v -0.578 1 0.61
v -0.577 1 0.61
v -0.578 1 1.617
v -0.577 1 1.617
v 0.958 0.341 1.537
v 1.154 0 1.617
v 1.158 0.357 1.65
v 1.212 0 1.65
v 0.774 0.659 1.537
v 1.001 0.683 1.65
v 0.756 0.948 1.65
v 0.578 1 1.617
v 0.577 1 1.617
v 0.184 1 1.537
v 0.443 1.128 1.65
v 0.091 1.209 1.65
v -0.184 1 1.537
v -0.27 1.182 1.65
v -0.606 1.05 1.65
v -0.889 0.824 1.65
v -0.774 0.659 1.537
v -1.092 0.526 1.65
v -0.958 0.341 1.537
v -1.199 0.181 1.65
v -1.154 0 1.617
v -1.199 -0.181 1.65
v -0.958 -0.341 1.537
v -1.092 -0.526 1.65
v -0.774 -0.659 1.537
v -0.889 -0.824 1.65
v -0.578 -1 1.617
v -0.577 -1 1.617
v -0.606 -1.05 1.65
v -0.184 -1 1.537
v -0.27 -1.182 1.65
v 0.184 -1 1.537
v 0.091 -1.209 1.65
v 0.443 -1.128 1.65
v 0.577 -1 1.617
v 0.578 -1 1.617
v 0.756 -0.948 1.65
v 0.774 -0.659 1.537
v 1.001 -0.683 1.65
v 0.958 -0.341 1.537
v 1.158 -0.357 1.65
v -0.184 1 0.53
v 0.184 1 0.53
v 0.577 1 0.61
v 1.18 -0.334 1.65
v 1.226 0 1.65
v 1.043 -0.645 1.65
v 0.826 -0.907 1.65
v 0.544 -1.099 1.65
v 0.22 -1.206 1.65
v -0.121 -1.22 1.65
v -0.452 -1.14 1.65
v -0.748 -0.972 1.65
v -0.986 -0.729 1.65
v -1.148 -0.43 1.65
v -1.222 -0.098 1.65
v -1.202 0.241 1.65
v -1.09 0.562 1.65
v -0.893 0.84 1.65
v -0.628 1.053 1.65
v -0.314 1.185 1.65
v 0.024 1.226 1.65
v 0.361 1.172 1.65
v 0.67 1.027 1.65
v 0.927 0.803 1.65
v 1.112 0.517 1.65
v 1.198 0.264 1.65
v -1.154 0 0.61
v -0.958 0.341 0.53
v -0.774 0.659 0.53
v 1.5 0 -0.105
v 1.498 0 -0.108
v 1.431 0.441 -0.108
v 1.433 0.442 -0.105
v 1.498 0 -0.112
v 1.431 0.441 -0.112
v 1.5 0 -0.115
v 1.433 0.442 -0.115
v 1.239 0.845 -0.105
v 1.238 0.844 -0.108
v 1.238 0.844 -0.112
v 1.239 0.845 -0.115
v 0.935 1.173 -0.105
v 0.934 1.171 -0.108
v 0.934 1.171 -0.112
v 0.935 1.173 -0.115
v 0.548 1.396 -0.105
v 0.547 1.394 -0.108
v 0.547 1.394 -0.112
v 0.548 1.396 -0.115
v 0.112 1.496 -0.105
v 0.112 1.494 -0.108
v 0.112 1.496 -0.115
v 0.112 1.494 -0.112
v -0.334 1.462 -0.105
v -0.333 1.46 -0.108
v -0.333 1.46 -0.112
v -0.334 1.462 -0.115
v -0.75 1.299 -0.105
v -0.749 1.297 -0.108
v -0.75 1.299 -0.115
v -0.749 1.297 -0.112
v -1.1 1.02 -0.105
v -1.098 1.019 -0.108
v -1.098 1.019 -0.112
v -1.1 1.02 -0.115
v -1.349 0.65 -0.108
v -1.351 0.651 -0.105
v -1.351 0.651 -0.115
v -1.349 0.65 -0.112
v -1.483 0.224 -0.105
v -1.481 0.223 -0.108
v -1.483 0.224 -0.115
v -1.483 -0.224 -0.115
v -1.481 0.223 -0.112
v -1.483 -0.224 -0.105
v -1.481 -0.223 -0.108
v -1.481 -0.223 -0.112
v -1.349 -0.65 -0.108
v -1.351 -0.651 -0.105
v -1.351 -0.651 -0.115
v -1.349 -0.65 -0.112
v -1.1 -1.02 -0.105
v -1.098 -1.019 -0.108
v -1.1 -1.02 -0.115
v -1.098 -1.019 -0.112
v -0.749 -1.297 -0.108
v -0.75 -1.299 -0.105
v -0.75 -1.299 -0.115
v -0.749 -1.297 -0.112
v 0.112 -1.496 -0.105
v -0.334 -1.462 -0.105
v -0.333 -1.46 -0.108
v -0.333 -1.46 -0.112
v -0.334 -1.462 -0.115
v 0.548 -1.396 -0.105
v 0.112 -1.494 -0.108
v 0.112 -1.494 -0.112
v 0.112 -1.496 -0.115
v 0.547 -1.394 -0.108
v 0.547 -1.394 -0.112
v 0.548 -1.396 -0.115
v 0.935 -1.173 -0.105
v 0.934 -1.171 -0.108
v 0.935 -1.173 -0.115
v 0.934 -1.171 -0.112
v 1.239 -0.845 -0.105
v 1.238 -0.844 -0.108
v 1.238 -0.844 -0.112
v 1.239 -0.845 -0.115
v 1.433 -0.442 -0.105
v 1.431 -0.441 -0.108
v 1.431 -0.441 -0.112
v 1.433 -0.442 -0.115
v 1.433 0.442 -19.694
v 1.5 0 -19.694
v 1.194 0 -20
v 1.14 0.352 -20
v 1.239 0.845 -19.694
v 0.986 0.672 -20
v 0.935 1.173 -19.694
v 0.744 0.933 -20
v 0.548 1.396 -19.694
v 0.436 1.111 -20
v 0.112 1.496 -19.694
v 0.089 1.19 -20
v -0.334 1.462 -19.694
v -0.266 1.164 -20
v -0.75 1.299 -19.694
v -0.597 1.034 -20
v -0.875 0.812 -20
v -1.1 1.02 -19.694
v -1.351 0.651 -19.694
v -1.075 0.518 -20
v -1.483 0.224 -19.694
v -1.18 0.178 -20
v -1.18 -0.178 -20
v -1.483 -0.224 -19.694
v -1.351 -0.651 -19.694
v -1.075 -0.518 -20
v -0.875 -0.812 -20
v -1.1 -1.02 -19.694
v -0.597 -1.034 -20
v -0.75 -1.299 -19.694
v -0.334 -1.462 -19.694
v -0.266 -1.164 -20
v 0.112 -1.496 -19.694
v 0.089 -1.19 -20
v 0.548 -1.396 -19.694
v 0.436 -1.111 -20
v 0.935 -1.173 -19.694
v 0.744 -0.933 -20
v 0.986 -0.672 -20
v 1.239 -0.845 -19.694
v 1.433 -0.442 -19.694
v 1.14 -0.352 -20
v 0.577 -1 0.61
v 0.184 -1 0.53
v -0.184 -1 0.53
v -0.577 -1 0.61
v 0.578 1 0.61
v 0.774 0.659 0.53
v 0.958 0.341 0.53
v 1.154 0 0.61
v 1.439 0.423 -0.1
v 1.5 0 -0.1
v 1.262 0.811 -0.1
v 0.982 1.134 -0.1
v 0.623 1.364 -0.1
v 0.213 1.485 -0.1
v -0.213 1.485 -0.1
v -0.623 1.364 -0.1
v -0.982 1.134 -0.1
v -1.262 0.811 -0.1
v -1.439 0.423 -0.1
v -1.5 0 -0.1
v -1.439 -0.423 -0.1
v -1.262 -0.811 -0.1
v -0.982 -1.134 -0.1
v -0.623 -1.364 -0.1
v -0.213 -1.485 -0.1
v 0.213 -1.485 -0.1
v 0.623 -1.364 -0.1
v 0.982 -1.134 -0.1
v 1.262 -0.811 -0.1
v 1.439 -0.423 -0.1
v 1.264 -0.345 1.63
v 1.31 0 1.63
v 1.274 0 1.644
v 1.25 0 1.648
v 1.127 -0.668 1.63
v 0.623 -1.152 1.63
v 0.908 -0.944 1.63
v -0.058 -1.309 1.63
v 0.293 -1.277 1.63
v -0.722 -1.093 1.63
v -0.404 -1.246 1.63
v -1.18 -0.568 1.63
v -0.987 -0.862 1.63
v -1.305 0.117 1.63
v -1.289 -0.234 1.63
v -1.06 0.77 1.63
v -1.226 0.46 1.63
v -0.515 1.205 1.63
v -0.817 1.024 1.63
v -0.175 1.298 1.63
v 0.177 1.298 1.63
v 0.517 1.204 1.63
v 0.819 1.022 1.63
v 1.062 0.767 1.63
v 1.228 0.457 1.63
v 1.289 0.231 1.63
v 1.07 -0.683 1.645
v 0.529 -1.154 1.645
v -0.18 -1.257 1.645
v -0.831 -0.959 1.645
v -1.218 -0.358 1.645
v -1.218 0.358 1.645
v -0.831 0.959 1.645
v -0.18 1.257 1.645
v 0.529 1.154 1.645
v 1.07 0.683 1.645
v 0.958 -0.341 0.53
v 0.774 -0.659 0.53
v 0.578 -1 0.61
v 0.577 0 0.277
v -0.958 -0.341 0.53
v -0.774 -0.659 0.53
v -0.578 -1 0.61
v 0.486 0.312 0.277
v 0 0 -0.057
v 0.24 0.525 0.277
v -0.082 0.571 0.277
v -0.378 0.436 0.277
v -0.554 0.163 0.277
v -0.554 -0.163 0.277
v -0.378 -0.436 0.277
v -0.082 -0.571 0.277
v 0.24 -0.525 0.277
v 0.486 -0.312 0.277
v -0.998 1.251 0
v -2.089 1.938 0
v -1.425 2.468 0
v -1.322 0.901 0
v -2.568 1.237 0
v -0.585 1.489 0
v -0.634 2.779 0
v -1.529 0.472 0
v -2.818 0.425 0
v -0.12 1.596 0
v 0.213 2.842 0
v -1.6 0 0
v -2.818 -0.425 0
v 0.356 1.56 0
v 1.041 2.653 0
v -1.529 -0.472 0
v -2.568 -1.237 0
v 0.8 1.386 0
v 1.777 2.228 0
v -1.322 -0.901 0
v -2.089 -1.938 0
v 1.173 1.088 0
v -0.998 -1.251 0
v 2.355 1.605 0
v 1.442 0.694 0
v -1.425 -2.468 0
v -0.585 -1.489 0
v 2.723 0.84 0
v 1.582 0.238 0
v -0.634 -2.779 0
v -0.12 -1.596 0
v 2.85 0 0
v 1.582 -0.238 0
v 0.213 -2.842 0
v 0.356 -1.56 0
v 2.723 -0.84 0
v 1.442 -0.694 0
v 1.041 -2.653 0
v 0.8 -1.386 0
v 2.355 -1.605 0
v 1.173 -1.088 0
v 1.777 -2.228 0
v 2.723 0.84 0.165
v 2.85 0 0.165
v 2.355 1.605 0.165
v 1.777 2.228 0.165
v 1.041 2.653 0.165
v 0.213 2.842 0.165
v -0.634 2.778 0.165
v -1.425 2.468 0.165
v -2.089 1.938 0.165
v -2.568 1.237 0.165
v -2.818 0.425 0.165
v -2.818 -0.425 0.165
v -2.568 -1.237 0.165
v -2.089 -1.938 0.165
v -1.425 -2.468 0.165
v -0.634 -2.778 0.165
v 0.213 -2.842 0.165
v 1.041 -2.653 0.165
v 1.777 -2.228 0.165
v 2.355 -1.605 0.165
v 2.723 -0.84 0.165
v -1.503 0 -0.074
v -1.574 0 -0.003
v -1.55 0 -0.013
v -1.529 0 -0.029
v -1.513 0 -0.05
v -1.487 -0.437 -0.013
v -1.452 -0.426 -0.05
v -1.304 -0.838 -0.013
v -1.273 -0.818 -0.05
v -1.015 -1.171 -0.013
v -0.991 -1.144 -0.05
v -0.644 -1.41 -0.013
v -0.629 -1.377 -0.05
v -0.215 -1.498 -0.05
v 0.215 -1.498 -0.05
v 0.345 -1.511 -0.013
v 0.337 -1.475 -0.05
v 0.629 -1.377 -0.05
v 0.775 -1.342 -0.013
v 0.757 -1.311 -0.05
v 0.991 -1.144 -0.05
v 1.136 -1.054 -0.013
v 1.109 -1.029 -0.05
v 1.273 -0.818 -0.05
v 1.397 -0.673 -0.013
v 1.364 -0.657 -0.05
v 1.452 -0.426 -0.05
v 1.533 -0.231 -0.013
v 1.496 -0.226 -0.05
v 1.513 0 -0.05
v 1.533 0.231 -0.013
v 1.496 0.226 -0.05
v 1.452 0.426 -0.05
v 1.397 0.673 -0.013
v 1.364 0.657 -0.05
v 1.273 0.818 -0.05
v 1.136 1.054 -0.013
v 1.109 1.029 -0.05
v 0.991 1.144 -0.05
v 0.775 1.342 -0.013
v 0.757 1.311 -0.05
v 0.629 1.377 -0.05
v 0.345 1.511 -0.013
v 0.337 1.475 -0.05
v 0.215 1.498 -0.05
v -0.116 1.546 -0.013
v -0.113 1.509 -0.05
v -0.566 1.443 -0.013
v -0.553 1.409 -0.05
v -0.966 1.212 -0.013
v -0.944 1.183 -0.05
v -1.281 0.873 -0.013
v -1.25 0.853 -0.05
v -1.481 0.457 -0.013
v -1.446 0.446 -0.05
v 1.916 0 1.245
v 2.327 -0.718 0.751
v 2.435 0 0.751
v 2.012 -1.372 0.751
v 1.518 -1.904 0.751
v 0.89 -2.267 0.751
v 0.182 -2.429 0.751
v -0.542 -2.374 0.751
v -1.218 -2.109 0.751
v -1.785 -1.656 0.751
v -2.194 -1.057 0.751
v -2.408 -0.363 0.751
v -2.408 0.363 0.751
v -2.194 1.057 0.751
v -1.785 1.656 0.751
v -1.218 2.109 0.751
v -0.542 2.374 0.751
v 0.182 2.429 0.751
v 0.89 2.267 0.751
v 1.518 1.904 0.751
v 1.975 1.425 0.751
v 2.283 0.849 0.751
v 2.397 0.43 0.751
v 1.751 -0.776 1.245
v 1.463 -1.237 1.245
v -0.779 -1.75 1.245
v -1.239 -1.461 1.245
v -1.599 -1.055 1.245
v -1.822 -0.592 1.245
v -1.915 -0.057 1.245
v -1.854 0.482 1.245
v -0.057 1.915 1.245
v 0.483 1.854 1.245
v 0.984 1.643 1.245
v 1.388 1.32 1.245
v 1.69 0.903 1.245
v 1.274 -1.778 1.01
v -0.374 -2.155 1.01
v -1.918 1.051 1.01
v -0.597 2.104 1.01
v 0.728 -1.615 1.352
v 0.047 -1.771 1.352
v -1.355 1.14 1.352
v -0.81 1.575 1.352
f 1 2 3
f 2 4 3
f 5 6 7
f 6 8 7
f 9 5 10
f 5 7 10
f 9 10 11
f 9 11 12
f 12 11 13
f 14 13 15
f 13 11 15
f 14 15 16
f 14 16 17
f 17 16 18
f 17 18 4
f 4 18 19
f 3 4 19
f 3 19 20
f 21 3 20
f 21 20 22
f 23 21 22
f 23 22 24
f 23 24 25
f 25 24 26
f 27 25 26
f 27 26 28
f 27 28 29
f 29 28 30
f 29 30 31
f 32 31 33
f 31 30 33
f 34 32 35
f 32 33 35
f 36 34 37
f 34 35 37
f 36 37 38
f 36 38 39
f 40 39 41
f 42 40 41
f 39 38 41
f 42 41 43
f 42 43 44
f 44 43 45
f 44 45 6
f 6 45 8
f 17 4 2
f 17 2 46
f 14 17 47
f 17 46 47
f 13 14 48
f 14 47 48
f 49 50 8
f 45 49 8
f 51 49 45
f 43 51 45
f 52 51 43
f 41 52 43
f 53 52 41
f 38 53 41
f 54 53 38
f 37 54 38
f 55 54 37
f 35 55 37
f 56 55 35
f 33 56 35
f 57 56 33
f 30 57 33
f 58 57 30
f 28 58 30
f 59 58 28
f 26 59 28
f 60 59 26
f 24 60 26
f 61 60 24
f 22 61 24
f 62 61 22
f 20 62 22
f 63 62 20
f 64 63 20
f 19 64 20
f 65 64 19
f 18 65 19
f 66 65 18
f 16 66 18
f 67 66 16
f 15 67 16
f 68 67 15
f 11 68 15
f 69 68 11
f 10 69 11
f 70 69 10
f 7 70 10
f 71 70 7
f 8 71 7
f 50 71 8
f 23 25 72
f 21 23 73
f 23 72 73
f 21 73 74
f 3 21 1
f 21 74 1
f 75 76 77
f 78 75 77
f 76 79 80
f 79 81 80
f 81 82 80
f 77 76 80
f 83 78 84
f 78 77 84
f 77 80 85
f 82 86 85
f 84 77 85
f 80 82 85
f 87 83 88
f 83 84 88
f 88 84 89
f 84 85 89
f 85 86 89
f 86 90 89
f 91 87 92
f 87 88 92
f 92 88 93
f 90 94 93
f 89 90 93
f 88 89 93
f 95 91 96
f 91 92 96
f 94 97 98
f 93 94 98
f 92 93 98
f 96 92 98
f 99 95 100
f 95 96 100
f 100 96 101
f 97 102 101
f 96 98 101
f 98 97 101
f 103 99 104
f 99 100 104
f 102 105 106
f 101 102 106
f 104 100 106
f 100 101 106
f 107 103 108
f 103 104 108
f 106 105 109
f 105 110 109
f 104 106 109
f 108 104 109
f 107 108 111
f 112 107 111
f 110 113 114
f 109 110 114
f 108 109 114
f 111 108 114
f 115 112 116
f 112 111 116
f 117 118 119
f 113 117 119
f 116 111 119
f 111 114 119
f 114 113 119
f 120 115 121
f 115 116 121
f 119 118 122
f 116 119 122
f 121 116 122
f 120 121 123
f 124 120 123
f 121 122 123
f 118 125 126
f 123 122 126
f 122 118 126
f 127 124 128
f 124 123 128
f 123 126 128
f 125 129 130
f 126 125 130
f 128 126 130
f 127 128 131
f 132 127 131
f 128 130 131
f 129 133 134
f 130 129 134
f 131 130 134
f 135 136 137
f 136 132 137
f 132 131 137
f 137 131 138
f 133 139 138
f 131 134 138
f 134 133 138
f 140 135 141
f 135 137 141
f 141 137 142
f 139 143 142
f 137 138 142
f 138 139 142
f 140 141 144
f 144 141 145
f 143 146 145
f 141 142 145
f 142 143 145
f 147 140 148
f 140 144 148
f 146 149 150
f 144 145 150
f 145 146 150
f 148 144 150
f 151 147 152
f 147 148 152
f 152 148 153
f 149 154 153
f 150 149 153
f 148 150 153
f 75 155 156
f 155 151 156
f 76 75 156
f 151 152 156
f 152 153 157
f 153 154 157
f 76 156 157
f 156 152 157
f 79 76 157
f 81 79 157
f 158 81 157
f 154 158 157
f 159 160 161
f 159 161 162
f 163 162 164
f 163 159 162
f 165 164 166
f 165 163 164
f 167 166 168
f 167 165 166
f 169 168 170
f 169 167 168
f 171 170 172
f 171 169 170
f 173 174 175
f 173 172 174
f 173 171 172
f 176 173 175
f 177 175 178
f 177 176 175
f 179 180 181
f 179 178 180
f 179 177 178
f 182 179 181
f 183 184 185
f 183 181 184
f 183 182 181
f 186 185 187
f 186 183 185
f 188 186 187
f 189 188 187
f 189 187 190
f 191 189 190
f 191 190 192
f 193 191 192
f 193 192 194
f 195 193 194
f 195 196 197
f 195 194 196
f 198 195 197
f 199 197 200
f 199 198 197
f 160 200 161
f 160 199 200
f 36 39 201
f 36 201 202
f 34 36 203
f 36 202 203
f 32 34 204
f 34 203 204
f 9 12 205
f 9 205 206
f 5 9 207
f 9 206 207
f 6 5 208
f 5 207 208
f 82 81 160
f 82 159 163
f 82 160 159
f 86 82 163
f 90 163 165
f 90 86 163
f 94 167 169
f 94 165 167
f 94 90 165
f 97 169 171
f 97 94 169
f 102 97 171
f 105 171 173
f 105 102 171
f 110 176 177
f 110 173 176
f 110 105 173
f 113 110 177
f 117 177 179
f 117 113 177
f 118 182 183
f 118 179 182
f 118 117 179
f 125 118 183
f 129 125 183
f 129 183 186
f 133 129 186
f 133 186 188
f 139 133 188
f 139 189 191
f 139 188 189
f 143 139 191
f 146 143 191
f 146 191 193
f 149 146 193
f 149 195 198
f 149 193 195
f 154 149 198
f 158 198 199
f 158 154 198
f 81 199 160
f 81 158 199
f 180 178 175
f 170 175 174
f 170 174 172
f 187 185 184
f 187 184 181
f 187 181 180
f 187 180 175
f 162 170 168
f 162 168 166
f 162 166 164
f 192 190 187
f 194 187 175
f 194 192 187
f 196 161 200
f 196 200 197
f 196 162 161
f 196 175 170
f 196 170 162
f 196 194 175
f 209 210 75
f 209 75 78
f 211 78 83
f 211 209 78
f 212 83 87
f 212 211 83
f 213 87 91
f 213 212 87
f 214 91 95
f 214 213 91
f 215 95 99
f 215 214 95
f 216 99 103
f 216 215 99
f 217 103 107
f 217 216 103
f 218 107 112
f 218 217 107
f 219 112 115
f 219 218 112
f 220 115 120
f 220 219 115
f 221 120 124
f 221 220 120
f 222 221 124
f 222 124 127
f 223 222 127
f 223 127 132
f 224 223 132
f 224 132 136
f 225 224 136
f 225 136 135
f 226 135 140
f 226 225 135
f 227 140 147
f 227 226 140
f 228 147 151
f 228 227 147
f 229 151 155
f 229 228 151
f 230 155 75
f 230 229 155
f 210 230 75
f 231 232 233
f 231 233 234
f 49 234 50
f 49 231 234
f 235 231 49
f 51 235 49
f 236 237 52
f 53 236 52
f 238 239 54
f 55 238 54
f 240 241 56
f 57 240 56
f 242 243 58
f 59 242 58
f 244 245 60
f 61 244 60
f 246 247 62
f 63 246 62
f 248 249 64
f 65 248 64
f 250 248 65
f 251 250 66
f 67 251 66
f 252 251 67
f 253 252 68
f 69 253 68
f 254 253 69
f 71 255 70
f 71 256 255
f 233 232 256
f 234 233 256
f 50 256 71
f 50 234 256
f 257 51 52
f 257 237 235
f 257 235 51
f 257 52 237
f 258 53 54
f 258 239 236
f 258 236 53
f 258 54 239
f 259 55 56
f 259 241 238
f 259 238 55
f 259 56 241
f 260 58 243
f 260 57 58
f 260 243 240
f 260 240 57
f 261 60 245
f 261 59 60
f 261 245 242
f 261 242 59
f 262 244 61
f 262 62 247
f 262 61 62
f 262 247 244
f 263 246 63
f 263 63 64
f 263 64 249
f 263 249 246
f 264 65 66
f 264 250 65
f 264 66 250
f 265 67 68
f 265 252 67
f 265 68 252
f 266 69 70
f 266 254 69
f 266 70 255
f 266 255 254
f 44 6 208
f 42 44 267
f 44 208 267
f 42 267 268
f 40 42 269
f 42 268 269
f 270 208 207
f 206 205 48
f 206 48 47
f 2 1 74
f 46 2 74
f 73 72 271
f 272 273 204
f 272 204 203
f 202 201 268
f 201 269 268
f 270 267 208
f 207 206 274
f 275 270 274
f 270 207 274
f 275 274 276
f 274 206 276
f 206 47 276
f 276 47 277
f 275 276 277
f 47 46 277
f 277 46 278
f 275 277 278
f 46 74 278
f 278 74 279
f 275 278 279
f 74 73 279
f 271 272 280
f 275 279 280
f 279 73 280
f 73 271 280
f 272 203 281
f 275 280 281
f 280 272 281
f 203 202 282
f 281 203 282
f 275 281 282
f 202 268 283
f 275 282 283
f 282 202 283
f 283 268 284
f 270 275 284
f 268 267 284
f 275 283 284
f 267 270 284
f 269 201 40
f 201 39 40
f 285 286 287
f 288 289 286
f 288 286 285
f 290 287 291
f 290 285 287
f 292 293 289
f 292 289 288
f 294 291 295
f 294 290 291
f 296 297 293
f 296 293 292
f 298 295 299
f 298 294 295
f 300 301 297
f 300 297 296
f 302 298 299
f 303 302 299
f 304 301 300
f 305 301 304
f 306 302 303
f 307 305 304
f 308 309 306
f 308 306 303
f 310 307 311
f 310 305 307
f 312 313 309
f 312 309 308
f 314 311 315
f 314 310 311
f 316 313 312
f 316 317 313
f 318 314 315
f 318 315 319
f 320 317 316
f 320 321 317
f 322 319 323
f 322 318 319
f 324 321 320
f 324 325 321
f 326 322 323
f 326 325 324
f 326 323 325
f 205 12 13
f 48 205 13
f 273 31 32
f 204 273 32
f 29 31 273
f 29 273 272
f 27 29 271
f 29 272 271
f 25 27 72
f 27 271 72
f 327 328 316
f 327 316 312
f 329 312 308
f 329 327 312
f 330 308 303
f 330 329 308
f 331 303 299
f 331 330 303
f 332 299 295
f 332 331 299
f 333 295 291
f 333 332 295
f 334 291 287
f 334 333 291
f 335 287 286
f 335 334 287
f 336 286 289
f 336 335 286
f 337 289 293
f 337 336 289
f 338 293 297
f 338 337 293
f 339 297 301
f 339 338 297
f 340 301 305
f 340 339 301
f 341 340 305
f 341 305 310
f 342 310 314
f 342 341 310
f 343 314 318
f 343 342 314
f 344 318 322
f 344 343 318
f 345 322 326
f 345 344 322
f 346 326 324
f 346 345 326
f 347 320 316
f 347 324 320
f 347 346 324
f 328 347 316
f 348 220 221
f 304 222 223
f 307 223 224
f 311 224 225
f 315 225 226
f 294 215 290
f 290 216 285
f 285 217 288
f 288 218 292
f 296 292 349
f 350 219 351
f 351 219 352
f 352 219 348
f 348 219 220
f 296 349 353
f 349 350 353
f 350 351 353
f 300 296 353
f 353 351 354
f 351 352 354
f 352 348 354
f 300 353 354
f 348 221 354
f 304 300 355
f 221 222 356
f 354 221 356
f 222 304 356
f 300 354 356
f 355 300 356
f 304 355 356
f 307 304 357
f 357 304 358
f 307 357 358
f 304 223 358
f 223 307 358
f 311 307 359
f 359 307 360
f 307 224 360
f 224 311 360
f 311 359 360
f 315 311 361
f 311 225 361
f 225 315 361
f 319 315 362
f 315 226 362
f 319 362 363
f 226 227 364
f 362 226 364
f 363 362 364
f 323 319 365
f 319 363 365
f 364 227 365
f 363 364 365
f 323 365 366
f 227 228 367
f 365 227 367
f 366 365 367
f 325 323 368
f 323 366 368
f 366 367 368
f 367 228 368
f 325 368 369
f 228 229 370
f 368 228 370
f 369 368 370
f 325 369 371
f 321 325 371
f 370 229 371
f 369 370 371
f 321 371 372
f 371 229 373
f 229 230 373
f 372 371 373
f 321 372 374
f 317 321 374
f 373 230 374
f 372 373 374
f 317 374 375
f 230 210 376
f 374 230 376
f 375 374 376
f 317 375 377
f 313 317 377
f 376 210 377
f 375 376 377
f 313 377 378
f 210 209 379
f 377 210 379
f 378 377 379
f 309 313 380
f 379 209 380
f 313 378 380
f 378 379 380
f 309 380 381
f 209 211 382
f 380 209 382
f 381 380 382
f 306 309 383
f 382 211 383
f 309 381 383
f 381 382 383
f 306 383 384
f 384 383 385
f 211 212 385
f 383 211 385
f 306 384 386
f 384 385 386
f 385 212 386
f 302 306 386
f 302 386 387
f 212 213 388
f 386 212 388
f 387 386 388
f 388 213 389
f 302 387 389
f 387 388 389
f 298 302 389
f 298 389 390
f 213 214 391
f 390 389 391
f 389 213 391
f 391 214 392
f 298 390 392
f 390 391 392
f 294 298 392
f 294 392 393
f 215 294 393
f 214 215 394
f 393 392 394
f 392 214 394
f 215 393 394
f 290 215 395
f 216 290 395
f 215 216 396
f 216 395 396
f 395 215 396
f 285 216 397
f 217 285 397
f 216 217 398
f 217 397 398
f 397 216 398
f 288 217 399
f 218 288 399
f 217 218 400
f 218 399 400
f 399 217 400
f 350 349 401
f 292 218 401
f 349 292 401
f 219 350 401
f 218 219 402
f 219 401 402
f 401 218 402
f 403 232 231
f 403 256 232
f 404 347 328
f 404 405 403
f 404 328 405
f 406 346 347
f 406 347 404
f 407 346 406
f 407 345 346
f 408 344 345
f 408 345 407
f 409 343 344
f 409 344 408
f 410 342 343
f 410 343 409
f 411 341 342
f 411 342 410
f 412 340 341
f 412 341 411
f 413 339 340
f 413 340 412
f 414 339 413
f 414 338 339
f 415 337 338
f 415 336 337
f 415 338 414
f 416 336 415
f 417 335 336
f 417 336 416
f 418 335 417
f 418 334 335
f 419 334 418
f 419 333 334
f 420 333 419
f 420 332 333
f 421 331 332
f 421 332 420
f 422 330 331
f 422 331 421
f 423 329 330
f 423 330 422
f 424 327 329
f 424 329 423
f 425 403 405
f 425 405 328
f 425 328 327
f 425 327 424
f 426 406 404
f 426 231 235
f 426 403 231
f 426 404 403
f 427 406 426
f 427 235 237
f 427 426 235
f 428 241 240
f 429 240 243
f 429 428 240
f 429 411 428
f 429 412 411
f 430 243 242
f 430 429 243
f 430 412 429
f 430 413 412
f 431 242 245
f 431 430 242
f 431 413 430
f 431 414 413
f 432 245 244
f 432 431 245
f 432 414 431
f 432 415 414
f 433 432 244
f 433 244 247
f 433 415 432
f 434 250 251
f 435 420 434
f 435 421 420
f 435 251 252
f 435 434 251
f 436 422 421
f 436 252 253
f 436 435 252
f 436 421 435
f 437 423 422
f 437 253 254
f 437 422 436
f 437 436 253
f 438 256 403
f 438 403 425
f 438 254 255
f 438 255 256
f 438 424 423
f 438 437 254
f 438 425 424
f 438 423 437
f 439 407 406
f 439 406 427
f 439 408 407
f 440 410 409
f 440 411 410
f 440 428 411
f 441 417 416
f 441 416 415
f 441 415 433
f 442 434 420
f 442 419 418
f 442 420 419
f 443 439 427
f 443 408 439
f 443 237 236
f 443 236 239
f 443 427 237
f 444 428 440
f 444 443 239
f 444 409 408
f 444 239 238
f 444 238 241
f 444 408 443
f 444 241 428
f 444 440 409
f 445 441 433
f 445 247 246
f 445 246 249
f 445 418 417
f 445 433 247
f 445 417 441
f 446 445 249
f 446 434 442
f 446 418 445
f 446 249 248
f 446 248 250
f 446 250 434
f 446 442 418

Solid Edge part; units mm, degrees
sketch "Sketch1" plane through (0, 0, 0) normal (0, -1, 0) x (1, 0, 0)
  line L0 (0, -20) -> (1.5, -20)
  line L1 (1.5, -20) -> (1.5, -0.115)
  arc A0 (1.5, -0.105) -> (1.5, -0.115) centre (1.5038, -0.11) ccw
  line L2 (1.5, -0.105) -> (1.5, 0)
  line L3 (1.5, 0) -> (2.85, 0)
  line L4 (2.85, 0) -> (2.85, 0.165)
  arc A1 (1.27, 1.65) -> (2.85, 0.165) centre (-0.3628, -1.6703) cw
  line L5 (0, 1.65) -> (1.27, 1.65)
  dimension "D1" = 19.885
  dimension "D2" = 1.5
  dimension "D3" = 1.27
  dimension "D4" = 2.85
  dimension "D5" = 0.165
  dimension "D6" = 1.65
  dimension "D7" = 3.7
  dimension "D8" = 20
  dimension "D9" = 0.01
  dimension "D10" = 0.0025
revolve "RevolvedProtrusion1" add sketch "Sketch1" angle 360 about axis through (0, 0, 5) along (0, 0, -1)
sketch "Sketch2" plane through (0, 0, 0) normal (0, -1, 0) x (1, 0, 0)
  line L0 (0, -0.0566) -> (1.1545, 0.61)
  line L1 (1.1545, 0.61) -> (1.1545, 1.65)
  line L2 (1.1545, 1.65) -> (0, 1.65)
  dimension "D1" = 1.1545
  dimension "D2" = 1.04
revolve "RevolvedCutout1" cut sketch "Sketch2" angle 360 about axis through (0, 0, 5.3) along (0, 0, -1)
sketch "Sketch3" plane through (0, 0, 0) normal (0, 0, -1) x (0, 1, 0)
  arc A0 (-1, 0.577) -> (-1, -0.577) centre (0, 0) ccw
  line L0 (-1, 0.577) -> (-1, -0.577)
  dimension "D1" = 1
extrude "Protrusion1" add sketch "Sketch3" against normal blind 1.65
pattern_circular "Pattern1" count 6 over 360 about axis through (0, 0, 0) along (0, 0, -1) of "Protrusion1"
fillet "Round_1" radius 0.185 1 edges at (-1.27, 0, 1.65)
sketch "Sketch4" plane through (0, 0, 0) normal (0, -1, 0) x (1, 0, 0)
  line L0 (0, 0.9501) -> (1.2122, 1.65)
  line L1 (1.2122, 1.65) -> (0, 1.65)
  dimension "D1" = 1.2122
revolve "RevolvedCutout2" cut sketch "Sketch4" angle 360 about axis through (0, 0, 5.3) along (0, 0, -1)
sketch "Sketch5" plane through (0, 0, 0) normal (0, -1, 0) x (1, 0, 0)
  line L0 (-1.5, 0) -> (-1.5, -0.1)
  line L1 (-1.6, 0) -> (-1.5, 0)
  arc A0 (-1.6, 0) -> (-1.5, -0.1) centre (-1.6, -0.1) cw
  dimension "D1" = 1.5
  dimension "D2" = 0.1
revolve "RevolvedProtrusion2" add sketch "Sketch5" angle 360 about axis through (0, 0, -0.5) along (0, 0, 1)
cosmetic_thread "Thread1" size "M3"
chamfer "Chamfer1" distance 0.3065 angle 45 1 edges at (-1.5, 0, -20)
properties material "Stahl"
